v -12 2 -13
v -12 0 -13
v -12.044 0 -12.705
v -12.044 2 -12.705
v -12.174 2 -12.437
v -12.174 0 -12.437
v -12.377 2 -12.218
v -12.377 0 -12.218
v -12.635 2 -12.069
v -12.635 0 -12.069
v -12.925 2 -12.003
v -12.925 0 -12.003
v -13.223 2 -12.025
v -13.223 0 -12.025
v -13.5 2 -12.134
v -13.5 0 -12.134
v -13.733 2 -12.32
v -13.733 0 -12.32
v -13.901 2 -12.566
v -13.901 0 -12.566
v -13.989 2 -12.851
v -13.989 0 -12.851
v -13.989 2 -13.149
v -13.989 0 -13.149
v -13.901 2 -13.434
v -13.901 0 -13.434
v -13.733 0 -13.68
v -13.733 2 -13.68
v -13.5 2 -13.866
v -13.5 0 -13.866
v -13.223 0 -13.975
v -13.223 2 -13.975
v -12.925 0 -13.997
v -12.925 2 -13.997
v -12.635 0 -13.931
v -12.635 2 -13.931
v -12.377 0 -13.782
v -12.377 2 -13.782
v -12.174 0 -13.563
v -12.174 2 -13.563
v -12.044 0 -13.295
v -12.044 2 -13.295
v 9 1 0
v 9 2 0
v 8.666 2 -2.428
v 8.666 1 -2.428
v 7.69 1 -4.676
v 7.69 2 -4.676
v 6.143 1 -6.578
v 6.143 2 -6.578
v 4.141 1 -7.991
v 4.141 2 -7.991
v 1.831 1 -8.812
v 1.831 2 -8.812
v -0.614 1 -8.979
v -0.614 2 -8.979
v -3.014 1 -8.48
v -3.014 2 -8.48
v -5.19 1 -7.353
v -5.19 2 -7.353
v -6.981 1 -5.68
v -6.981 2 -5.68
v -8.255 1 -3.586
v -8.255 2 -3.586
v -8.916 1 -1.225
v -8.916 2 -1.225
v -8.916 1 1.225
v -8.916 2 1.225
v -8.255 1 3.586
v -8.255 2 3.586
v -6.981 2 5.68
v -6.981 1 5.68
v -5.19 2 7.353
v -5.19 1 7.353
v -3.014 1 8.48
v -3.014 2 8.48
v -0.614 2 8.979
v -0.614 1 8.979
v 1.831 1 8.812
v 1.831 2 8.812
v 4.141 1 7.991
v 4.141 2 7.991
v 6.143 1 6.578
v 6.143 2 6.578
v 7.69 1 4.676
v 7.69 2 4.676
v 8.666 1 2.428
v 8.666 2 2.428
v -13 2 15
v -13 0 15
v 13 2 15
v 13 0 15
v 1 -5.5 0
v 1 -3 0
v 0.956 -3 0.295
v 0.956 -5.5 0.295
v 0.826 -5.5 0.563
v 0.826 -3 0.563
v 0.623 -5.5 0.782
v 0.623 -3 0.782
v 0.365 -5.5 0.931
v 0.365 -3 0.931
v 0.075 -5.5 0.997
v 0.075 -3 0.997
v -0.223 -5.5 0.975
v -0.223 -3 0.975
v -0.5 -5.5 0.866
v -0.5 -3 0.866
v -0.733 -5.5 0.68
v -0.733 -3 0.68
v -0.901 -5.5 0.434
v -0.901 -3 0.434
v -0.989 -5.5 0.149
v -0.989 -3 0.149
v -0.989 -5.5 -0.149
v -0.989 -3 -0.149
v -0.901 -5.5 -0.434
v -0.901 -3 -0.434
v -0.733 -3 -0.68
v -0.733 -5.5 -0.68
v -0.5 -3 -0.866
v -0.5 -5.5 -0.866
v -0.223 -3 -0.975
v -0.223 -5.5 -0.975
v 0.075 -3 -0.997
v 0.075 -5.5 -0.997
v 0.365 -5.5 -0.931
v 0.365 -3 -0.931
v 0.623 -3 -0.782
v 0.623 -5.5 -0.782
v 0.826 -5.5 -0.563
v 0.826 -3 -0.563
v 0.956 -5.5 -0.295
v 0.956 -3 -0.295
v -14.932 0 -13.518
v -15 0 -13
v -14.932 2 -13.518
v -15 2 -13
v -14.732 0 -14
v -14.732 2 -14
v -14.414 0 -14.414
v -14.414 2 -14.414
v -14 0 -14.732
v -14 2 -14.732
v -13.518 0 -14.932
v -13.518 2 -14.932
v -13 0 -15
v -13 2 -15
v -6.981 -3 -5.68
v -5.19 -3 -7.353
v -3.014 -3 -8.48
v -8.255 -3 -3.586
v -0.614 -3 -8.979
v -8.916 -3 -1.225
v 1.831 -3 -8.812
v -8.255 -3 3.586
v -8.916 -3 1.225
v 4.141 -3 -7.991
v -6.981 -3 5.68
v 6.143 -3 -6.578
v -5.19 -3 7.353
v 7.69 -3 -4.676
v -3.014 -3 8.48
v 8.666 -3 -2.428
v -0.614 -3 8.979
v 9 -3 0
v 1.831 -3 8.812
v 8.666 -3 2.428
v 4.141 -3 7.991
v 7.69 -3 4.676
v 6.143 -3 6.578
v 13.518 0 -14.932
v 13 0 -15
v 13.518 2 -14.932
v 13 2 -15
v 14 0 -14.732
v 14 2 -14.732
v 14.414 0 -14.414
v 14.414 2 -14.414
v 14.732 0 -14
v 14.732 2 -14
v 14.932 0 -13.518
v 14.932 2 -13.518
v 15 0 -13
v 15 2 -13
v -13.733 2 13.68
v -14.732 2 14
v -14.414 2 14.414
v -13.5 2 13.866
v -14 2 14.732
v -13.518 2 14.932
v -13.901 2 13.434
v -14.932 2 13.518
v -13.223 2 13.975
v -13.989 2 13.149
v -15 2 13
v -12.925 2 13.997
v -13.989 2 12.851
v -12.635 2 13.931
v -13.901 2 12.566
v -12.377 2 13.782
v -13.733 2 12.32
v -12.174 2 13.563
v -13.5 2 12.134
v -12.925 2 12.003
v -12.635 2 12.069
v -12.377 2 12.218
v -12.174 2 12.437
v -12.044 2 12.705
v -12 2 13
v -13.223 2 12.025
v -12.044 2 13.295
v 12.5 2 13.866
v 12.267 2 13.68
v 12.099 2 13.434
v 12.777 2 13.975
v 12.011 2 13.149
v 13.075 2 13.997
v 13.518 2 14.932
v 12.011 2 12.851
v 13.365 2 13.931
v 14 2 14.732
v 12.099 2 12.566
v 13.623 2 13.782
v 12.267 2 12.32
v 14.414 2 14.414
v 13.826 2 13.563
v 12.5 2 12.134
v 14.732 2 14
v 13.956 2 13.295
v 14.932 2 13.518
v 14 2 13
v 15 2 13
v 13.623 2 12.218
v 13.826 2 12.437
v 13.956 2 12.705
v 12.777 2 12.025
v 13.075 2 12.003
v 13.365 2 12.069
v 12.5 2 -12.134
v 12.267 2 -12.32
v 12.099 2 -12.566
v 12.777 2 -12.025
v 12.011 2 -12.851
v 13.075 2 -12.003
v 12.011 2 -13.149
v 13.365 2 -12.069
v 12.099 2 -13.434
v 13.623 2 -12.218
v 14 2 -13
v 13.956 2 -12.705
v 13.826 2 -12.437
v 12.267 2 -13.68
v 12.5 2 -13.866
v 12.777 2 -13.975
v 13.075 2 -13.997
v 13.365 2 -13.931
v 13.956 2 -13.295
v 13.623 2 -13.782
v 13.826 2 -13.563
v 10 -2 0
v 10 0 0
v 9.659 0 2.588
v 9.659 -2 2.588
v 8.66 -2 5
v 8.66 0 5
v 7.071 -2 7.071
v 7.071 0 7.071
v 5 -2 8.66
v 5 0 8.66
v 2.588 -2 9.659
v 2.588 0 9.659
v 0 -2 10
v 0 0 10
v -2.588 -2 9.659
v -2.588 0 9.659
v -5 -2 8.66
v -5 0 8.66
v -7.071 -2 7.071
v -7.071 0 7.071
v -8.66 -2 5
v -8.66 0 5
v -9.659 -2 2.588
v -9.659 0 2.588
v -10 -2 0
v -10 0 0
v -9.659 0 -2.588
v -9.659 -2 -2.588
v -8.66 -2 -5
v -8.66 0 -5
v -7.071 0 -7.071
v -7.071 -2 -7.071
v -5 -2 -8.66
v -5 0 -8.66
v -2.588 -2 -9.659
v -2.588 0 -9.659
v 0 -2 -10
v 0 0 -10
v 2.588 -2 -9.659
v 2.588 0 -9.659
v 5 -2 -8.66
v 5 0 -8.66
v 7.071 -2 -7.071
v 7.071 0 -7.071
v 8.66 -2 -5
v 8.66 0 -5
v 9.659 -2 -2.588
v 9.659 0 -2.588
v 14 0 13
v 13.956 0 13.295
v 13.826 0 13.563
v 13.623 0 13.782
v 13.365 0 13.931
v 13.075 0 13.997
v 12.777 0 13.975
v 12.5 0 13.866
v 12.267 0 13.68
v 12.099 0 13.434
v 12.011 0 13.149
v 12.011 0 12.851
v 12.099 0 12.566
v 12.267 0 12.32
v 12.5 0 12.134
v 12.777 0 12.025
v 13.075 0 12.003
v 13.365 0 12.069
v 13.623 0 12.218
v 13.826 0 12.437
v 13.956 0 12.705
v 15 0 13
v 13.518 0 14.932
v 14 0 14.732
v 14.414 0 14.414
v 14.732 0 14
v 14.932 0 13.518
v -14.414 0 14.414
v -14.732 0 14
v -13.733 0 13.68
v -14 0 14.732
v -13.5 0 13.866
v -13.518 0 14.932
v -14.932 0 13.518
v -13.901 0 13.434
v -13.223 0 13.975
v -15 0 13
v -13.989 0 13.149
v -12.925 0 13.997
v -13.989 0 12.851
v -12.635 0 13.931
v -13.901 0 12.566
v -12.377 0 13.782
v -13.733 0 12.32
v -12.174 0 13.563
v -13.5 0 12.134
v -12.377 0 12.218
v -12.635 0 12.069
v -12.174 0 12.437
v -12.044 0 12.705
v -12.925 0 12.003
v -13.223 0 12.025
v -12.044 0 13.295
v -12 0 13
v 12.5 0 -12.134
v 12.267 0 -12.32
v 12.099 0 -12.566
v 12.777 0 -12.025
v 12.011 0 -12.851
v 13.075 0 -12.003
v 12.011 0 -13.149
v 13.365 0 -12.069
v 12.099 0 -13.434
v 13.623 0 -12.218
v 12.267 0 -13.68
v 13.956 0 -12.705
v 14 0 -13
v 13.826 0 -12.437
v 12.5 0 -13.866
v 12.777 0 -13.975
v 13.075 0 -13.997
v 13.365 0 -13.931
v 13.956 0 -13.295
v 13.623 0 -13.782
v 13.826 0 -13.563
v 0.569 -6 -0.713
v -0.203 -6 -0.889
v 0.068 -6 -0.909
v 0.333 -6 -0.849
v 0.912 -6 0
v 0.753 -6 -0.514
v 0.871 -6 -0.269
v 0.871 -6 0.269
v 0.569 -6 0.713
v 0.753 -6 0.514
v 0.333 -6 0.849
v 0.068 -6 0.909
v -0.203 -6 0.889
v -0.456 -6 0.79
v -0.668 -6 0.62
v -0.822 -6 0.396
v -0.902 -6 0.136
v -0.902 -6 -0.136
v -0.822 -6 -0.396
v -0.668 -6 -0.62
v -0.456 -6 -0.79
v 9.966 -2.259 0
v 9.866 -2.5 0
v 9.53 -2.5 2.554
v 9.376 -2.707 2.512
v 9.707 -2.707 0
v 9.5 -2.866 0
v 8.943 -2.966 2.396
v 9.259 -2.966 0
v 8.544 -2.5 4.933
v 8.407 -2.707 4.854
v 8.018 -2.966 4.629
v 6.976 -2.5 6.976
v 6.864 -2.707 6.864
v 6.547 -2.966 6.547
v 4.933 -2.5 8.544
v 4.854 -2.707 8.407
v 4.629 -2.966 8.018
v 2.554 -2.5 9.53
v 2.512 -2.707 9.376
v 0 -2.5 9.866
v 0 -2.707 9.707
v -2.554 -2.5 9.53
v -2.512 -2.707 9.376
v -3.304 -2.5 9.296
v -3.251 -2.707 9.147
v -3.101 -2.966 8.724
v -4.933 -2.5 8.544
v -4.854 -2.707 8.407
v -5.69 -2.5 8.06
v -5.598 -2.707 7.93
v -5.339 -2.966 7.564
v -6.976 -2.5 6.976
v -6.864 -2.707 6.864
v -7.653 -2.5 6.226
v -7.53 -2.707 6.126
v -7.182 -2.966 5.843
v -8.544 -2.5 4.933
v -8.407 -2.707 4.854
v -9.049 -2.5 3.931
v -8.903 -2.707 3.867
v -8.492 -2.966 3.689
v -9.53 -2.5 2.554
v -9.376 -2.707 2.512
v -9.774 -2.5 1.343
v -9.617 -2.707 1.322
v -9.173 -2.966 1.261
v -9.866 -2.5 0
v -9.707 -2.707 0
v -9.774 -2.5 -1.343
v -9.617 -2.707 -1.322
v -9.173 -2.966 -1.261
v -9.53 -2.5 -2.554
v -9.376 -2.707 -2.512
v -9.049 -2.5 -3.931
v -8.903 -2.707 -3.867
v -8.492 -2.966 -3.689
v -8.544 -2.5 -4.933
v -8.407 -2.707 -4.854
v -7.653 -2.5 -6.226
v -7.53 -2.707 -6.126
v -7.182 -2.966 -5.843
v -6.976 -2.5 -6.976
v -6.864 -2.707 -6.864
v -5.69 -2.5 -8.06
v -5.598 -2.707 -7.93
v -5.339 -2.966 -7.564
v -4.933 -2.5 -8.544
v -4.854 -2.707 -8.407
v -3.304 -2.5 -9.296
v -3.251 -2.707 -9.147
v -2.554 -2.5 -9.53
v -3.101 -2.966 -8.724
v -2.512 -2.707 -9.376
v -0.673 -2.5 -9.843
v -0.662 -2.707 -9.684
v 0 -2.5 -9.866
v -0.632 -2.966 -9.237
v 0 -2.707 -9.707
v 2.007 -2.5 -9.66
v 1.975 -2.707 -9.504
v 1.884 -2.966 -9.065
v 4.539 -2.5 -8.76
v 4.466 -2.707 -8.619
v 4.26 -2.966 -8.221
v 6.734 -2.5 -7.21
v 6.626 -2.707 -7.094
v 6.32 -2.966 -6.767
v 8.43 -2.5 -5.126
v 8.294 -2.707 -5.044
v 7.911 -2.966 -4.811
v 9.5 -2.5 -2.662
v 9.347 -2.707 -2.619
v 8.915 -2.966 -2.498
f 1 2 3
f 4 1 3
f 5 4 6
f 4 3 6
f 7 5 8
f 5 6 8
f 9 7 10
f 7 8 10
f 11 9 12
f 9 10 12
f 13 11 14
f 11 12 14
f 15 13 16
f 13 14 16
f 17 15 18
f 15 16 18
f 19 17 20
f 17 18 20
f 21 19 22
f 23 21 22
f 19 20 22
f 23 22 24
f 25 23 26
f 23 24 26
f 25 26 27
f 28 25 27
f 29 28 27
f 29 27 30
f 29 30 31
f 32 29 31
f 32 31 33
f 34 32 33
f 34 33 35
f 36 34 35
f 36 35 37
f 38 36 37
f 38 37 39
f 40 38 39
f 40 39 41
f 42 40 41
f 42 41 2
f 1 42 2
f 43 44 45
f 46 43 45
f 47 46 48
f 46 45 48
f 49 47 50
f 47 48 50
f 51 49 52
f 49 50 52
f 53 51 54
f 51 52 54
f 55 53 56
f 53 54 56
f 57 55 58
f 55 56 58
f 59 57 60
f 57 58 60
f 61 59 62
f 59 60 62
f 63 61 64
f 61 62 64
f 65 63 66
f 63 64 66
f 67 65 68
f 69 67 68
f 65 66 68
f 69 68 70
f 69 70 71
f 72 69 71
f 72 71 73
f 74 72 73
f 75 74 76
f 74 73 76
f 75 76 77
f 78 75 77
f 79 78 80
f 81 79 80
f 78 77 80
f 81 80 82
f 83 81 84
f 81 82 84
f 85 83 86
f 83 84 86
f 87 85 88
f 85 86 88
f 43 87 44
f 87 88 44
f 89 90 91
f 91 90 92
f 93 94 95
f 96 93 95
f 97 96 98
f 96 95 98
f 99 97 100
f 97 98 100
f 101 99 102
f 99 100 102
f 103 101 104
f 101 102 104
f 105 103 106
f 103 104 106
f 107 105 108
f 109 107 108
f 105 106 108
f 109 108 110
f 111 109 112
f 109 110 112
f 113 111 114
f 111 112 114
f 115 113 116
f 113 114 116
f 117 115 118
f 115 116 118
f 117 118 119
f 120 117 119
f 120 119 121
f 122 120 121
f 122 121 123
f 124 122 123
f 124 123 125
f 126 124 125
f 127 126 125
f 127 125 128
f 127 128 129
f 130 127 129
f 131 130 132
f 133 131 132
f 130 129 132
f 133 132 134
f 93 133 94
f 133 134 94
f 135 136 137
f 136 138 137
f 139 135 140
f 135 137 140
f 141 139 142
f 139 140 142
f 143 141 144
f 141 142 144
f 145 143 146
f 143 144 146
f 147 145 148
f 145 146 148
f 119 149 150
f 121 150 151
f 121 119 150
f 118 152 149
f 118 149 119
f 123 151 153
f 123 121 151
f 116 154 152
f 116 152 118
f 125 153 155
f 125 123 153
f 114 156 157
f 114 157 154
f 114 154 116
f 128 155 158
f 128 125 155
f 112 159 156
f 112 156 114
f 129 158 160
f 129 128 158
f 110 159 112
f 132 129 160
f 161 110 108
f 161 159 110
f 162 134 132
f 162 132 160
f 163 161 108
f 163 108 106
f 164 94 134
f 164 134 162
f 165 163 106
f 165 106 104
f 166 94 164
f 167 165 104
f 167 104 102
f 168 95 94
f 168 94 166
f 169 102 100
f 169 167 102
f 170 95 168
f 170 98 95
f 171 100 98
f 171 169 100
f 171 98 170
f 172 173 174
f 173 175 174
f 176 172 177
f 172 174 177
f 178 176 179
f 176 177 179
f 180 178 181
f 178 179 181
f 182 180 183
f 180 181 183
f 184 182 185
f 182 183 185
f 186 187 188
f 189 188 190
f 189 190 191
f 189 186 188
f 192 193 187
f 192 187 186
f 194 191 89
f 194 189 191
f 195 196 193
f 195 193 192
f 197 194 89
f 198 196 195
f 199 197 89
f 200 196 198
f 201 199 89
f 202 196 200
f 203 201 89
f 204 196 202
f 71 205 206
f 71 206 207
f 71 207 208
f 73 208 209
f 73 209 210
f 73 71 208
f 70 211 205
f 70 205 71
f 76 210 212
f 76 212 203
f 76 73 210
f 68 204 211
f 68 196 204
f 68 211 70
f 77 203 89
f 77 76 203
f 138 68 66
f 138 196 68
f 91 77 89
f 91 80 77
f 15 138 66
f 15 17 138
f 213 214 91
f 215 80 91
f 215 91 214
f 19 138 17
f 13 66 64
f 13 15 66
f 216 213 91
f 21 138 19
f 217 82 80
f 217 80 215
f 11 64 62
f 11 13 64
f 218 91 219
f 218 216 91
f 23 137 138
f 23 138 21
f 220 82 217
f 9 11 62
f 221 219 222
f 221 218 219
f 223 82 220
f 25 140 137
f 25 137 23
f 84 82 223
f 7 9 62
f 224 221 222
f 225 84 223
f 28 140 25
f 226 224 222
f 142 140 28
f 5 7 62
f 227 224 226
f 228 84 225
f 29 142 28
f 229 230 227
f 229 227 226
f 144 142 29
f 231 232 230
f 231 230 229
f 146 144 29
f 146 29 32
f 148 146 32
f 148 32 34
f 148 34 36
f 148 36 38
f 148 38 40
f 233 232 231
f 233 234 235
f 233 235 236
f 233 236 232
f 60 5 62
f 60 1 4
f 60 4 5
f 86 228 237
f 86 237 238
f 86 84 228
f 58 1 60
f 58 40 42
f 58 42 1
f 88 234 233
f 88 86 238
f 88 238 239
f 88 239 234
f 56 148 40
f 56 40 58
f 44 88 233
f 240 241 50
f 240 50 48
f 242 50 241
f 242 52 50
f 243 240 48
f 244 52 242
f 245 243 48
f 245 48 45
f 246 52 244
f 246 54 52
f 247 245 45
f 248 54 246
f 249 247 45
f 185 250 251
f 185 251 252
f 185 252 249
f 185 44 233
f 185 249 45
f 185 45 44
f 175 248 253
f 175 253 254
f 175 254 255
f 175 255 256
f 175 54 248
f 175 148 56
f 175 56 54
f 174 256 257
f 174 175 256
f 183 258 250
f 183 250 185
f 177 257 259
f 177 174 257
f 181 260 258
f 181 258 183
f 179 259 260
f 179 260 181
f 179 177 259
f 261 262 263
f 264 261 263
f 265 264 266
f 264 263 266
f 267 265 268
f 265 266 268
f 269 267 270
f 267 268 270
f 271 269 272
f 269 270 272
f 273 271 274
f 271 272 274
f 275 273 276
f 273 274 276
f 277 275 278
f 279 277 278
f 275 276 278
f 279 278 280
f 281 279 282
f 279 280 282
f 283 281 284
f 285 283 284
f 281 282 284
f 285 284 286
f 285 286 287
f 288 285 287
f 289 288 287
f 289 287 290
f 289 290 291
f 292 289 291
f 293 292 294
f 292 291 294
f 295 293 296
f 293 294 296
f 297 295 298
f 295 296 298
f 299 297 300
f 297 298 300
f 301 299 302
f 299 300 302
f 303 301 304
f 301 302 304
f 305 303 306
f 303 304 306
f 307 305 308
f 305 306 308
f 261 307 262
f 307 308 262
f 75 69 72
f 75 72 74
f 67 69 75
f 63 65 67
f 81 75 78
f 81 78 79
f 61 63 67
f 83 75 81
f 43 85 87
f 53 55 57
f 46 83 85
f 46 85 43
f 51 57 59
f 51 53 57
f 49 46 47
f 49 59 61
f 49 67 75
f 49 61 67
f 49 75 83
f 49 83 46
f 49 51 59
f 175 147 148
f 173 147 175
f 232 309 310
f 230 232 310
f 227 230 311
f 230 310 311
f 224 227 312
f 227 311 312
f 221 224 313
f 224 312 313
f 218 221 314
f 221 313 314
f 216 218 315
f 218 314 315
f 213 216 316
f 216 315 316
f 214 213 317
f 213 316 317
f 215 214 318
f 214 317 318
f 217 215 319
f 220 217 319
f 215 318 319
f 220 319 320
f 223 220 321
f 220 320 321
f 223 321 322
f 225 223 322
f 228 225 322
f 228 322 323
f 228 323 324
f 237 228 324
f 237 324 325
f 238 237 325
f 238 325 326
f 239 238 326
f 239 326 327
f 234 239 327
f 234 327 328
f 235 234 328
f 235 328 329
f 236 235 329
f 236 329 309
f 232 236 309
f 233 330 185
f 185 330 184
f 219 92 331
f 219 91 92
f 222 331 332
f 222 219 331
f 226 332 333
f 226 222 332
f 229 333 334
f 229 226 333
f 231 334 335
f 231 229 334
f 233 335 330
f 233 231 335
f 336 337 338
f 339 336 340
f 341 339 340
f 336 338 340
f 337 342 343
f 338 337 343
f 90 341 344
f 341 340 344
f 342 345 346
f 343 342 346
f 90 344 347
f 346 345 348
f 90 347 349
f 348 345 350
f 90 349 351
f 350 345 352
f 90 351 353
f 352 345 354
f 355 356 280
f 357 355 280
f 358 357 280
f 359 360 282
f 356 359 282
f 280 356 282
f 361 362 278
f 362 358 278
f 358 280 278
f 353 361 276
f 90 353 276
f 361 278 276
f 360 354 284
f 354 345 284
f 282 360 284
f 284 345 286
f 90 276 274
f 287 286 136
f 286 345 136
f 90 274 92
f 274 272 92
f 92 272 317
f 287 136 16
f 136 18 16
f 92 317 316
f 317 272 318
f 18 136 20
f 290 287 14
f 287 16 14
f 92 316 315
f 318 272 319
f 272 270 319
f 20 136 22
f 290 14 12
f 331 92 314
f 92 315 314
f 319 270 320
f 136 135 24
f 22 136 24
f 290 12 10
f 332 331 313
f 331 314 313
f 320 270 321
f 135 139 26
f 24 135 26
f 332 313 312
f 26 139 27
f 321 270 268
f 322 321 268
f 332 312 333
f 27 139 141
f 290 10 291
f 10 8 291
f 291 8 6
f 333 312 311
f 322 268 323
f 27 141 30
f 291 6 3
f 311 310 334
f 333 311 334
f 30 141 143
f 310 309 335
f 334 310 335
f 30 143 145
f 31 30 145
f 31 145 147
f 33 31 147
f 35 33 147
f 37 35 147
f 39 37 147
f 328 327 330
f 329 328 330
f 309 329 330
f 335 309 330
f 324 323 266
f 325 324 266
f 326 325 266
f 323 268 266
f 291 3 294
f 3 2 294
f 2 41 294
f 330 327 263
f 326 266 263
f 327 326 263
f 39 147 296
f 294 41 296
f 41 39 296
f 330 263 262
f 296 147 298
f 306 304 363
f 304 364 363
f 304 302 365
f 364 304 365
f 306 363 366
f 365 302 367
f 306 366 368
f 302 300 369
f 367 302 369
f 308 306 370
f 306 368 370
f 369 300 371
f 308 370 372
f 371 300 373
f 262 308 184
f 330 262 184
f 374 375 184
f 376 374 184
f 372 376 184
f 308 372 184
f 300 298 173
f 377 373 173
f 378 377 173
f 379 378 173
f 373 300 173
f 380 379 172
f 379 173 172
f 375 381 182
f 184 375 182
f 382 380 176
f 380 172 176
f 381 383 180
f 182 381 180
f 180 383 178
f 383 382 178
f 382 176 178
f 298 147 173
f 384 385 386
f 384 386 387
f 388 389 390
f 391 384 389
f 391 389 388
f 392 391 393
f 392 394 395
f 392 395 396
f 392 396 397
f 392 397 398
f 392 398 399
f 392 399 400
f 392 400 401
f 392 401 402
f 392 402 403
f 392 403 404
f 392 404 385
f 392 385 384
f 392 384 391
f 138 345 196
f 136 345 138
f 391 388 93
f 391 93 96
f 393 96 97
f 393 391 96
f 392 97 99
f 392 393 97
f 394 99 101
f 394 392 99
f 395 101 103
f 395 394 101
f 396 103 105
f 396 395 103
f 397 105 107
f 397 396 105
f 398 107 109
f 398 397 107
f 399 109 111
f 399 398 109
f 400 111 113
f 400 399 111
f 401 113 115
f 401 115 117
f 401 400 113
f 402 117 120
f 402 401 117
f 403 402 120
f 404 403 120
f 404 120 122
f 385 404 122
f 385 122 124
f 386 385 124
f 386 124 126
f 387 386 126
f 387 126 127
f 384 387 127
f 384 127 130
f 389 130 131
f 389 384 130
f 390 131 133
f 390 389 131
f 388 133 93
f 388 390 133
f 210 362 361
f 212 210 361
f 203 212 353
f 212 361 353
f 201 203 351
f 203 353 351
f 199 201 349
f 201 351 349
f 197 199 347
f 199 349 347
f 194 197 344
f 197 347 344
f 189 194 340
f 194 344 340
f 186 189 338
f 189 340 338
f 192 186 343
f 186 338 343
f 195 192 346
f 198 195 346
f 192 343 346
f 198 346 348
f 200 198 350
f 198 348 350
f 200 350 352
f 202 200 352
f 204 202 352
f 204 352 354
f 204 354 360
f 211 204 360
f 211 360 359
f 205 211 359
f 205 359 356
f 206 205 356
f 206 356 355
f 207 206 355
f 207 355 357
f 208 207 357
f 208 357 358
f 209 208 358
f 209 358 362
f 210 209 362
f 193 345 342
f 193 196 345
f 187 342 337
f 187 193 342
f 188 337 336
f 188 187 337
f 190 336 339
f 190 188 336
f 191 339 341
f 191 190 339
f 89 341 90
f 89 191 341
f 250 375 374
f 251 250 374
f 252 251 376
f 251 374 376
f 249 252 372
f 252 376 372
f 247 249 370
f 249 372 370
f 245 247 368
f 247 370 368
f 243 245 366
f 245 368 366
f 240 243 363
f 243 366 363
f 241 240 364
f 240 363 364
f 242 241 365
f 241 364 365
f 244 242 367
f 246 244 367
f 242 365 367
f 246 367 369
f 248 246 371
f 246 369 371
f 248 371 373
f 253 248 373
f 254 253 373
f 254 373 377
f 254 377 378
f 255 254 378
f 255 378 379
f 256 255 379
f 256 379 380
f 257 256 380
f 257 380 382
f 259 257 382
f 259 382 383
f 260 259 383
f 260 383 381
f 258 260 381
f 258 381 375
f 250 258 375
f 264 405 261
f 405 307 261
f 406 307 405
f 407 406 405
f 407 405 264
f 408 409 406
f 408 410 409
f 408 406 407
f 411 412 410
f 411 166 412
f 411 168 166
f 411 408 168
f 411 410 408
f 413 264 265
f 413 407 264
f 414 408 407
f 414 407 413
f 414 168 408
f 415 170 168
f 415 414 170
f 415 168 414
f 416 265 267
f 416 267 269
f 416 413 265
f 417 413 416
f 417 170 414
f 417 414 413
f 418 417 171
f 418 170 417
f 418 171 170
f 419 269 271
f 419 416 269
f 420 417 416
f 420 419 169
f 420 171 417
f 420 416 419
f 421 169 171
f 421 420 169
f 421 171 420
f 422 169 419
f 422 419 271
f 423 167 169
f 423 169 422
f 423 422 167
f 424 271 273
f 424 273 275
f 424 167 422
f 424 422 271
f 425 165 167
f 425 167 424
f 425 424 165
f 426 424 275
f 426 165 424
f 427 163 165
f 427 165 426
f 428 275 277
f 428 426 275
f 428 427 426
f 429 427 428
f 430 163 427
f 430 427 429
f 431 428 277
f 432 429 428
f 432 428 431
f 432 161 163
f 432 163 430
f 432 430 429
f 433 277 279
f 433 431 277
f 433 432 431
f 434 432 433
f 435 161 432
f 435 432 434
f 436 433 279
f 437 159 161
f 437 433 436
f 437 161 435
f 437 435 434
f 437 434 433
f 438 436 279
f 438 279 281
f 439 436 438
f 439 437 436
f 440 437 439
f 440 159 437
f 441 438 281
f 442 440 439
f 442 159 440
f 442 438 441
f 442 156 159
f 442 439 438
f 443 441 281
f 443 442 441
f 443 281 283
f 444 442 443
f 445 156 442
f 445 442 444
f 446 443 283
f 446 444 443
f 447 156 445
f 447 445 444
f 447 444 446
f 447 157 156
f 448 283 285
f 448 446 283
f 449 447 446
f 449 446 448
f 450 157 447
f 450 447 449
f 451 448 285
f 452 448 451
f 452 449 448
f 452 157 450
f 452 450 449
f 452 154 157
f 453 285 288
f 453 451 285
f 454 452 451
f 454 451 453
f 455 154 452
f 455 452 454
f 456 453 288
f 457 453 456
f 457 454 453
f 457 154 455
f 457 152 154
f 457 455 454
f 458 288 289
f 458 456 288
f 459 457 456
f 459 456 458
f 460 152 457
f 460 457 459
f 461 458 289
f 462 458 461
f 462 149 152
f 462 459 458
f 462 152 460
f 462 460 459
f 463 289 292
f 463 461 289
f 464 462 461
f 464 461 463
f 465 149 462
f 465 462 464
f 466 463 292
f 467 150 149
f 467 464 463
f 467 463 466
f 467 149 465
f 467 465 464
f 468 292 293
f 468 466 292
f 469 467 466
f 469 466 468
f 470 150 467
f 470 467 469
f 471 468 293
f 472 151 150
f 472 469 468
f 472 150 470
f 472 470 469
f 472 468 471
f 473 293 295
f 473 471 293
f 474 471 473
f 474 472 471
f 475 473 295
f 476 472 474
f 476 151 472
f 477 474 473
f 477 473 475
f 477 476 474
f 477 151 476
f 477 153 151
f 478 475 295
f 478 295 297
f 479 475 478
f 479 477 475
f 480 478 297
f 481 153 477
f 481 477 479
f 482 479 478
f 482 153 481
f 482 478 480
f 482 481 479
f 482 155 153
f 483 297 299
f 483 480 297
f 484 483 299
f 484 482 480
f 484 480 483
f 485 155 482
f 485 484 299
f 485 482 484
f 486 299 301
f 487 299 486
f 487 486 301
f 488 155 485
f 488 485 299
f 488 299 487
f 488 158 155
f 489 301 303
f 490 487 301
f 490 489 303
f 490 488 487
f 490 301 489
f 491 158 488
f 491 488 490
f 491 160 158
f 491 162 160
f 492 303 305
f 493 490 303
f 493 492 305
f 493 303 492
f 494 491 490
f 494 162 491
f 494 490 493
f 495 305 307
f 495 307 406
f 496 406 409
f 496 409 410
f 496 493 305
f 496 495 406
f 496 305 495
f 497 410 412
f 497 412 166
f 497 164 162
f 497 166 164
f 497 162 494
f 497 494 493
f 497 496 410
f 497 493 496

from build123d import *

# Parameters (mm, degrees)
SKETCH1_W           = 30
SKETCH1_H           = 30
BOSS_EXTRUDE1_DEPTH = 2
SKETCH2_R           = 9
CUT_EXTRUDE1_DEPTH  = 1
SKETCH3_R           = 10
BOSS_EXTRUDE2_DEPTH = 3
SKETCH4_R           = 1
BOSS_EXTRUDE3_DEPTH = 3
FILLET1_R           = 1
CHAMFER2_SIZE       = 0.5
CHAMFER2_SIZE2      = 0.08816349
SKETCH5_R           = 1
CUT_EXTRUDE2_DEPTH  = 3
FILLET2_R           = 2


with BuildPart() as part:
    # Sketch1 → Boss-Extrude1 (new body)
    with BuildSketch(Plane(origin=(0, 0, 0), x_dir=(1, 0, 0), z_dir=(0, 1, 0))):
        Rectangle(SKETCH1_W, SKETCH1_H)
    extrude(amount=BOSS_EXTRUDE1_DEPTH)

    # Sketch2 → Cut-Extrude1 (cut)
    with BuildSketch(Plane(origin=(0, 2, 0), x_dir=(1, 0, 0), z_dir=(0, 1, 0))):
        Circle(SKETCH2_R)
    extrude(amount=-CUT_EXTRUDE1_DEPTH, mode=Mode.SUBTRACT)

    # Sketch3 → Boss-Extrude2 (add)
    with BuildSketch(Plane.XZ):
        Circle(SKETCH3_R)
    extrude(amount=BOSS_EXTRUDE2_DEPTH)

    # Sketch4 → Boss-Extrude3 (add)
    with BuildSketch(Plane.XZ.offset(3)):
        Circle(SKETCH4_R)
    extrude(amount=BOSS_EXTRUDE3_DEPTH)

    # Fillet1
    fillet1_edges = [part.edges().sort_by_distance(p)[0] for p in [
        (-10, -3, 0),
    ]]
    fillet(fillet1_edges, radius=FILLET1_R)

    # Chamfer2
    chamfer2_edges = [part.edges().sort_by_distance(p)[0] for p in [
        (-1, -6, 0),
    ]]
    chamfer2_side = [part.faces().sort_by_distance(p)[0] for p in [
        (-1, -4.5, 0),
    ]]
    chamfer(chamfer2_edges, length=CHAMFER2_SIZE, length2=CHAMFER2_SIZE2, reference=chamfer2_side[0])

    # Sketch5 → Cut-Extrude2 (cut, through all)
    with BuildSketch(Plane.XZ):
        with Locations((-13, 13)):
            Circle(SKETCH5_R)
        with Locations((13, 13)):
            Circle(SKETCH5_R)
        with Locations((13, -13)):
            Circle(SKETCH5_R)
        with Locations((-13, -13)):
            Circle(SKETCH5_R)
    extrude(amount=-CUT_EXTRUDE2_DEPTH, mode=Mode.SUBTRACT)

    # Fillet2
    fillet2_edges = [part.edges().sort_by_distance(p)[0] for p in [
        (15, 1, 15),
        (-15, 1, 15),
        (-15, 1, -15),
        (15, 1, -15),
    ]]
    fillet(fillet2_edges, radius=FILLET2_R)


solid = part.part
